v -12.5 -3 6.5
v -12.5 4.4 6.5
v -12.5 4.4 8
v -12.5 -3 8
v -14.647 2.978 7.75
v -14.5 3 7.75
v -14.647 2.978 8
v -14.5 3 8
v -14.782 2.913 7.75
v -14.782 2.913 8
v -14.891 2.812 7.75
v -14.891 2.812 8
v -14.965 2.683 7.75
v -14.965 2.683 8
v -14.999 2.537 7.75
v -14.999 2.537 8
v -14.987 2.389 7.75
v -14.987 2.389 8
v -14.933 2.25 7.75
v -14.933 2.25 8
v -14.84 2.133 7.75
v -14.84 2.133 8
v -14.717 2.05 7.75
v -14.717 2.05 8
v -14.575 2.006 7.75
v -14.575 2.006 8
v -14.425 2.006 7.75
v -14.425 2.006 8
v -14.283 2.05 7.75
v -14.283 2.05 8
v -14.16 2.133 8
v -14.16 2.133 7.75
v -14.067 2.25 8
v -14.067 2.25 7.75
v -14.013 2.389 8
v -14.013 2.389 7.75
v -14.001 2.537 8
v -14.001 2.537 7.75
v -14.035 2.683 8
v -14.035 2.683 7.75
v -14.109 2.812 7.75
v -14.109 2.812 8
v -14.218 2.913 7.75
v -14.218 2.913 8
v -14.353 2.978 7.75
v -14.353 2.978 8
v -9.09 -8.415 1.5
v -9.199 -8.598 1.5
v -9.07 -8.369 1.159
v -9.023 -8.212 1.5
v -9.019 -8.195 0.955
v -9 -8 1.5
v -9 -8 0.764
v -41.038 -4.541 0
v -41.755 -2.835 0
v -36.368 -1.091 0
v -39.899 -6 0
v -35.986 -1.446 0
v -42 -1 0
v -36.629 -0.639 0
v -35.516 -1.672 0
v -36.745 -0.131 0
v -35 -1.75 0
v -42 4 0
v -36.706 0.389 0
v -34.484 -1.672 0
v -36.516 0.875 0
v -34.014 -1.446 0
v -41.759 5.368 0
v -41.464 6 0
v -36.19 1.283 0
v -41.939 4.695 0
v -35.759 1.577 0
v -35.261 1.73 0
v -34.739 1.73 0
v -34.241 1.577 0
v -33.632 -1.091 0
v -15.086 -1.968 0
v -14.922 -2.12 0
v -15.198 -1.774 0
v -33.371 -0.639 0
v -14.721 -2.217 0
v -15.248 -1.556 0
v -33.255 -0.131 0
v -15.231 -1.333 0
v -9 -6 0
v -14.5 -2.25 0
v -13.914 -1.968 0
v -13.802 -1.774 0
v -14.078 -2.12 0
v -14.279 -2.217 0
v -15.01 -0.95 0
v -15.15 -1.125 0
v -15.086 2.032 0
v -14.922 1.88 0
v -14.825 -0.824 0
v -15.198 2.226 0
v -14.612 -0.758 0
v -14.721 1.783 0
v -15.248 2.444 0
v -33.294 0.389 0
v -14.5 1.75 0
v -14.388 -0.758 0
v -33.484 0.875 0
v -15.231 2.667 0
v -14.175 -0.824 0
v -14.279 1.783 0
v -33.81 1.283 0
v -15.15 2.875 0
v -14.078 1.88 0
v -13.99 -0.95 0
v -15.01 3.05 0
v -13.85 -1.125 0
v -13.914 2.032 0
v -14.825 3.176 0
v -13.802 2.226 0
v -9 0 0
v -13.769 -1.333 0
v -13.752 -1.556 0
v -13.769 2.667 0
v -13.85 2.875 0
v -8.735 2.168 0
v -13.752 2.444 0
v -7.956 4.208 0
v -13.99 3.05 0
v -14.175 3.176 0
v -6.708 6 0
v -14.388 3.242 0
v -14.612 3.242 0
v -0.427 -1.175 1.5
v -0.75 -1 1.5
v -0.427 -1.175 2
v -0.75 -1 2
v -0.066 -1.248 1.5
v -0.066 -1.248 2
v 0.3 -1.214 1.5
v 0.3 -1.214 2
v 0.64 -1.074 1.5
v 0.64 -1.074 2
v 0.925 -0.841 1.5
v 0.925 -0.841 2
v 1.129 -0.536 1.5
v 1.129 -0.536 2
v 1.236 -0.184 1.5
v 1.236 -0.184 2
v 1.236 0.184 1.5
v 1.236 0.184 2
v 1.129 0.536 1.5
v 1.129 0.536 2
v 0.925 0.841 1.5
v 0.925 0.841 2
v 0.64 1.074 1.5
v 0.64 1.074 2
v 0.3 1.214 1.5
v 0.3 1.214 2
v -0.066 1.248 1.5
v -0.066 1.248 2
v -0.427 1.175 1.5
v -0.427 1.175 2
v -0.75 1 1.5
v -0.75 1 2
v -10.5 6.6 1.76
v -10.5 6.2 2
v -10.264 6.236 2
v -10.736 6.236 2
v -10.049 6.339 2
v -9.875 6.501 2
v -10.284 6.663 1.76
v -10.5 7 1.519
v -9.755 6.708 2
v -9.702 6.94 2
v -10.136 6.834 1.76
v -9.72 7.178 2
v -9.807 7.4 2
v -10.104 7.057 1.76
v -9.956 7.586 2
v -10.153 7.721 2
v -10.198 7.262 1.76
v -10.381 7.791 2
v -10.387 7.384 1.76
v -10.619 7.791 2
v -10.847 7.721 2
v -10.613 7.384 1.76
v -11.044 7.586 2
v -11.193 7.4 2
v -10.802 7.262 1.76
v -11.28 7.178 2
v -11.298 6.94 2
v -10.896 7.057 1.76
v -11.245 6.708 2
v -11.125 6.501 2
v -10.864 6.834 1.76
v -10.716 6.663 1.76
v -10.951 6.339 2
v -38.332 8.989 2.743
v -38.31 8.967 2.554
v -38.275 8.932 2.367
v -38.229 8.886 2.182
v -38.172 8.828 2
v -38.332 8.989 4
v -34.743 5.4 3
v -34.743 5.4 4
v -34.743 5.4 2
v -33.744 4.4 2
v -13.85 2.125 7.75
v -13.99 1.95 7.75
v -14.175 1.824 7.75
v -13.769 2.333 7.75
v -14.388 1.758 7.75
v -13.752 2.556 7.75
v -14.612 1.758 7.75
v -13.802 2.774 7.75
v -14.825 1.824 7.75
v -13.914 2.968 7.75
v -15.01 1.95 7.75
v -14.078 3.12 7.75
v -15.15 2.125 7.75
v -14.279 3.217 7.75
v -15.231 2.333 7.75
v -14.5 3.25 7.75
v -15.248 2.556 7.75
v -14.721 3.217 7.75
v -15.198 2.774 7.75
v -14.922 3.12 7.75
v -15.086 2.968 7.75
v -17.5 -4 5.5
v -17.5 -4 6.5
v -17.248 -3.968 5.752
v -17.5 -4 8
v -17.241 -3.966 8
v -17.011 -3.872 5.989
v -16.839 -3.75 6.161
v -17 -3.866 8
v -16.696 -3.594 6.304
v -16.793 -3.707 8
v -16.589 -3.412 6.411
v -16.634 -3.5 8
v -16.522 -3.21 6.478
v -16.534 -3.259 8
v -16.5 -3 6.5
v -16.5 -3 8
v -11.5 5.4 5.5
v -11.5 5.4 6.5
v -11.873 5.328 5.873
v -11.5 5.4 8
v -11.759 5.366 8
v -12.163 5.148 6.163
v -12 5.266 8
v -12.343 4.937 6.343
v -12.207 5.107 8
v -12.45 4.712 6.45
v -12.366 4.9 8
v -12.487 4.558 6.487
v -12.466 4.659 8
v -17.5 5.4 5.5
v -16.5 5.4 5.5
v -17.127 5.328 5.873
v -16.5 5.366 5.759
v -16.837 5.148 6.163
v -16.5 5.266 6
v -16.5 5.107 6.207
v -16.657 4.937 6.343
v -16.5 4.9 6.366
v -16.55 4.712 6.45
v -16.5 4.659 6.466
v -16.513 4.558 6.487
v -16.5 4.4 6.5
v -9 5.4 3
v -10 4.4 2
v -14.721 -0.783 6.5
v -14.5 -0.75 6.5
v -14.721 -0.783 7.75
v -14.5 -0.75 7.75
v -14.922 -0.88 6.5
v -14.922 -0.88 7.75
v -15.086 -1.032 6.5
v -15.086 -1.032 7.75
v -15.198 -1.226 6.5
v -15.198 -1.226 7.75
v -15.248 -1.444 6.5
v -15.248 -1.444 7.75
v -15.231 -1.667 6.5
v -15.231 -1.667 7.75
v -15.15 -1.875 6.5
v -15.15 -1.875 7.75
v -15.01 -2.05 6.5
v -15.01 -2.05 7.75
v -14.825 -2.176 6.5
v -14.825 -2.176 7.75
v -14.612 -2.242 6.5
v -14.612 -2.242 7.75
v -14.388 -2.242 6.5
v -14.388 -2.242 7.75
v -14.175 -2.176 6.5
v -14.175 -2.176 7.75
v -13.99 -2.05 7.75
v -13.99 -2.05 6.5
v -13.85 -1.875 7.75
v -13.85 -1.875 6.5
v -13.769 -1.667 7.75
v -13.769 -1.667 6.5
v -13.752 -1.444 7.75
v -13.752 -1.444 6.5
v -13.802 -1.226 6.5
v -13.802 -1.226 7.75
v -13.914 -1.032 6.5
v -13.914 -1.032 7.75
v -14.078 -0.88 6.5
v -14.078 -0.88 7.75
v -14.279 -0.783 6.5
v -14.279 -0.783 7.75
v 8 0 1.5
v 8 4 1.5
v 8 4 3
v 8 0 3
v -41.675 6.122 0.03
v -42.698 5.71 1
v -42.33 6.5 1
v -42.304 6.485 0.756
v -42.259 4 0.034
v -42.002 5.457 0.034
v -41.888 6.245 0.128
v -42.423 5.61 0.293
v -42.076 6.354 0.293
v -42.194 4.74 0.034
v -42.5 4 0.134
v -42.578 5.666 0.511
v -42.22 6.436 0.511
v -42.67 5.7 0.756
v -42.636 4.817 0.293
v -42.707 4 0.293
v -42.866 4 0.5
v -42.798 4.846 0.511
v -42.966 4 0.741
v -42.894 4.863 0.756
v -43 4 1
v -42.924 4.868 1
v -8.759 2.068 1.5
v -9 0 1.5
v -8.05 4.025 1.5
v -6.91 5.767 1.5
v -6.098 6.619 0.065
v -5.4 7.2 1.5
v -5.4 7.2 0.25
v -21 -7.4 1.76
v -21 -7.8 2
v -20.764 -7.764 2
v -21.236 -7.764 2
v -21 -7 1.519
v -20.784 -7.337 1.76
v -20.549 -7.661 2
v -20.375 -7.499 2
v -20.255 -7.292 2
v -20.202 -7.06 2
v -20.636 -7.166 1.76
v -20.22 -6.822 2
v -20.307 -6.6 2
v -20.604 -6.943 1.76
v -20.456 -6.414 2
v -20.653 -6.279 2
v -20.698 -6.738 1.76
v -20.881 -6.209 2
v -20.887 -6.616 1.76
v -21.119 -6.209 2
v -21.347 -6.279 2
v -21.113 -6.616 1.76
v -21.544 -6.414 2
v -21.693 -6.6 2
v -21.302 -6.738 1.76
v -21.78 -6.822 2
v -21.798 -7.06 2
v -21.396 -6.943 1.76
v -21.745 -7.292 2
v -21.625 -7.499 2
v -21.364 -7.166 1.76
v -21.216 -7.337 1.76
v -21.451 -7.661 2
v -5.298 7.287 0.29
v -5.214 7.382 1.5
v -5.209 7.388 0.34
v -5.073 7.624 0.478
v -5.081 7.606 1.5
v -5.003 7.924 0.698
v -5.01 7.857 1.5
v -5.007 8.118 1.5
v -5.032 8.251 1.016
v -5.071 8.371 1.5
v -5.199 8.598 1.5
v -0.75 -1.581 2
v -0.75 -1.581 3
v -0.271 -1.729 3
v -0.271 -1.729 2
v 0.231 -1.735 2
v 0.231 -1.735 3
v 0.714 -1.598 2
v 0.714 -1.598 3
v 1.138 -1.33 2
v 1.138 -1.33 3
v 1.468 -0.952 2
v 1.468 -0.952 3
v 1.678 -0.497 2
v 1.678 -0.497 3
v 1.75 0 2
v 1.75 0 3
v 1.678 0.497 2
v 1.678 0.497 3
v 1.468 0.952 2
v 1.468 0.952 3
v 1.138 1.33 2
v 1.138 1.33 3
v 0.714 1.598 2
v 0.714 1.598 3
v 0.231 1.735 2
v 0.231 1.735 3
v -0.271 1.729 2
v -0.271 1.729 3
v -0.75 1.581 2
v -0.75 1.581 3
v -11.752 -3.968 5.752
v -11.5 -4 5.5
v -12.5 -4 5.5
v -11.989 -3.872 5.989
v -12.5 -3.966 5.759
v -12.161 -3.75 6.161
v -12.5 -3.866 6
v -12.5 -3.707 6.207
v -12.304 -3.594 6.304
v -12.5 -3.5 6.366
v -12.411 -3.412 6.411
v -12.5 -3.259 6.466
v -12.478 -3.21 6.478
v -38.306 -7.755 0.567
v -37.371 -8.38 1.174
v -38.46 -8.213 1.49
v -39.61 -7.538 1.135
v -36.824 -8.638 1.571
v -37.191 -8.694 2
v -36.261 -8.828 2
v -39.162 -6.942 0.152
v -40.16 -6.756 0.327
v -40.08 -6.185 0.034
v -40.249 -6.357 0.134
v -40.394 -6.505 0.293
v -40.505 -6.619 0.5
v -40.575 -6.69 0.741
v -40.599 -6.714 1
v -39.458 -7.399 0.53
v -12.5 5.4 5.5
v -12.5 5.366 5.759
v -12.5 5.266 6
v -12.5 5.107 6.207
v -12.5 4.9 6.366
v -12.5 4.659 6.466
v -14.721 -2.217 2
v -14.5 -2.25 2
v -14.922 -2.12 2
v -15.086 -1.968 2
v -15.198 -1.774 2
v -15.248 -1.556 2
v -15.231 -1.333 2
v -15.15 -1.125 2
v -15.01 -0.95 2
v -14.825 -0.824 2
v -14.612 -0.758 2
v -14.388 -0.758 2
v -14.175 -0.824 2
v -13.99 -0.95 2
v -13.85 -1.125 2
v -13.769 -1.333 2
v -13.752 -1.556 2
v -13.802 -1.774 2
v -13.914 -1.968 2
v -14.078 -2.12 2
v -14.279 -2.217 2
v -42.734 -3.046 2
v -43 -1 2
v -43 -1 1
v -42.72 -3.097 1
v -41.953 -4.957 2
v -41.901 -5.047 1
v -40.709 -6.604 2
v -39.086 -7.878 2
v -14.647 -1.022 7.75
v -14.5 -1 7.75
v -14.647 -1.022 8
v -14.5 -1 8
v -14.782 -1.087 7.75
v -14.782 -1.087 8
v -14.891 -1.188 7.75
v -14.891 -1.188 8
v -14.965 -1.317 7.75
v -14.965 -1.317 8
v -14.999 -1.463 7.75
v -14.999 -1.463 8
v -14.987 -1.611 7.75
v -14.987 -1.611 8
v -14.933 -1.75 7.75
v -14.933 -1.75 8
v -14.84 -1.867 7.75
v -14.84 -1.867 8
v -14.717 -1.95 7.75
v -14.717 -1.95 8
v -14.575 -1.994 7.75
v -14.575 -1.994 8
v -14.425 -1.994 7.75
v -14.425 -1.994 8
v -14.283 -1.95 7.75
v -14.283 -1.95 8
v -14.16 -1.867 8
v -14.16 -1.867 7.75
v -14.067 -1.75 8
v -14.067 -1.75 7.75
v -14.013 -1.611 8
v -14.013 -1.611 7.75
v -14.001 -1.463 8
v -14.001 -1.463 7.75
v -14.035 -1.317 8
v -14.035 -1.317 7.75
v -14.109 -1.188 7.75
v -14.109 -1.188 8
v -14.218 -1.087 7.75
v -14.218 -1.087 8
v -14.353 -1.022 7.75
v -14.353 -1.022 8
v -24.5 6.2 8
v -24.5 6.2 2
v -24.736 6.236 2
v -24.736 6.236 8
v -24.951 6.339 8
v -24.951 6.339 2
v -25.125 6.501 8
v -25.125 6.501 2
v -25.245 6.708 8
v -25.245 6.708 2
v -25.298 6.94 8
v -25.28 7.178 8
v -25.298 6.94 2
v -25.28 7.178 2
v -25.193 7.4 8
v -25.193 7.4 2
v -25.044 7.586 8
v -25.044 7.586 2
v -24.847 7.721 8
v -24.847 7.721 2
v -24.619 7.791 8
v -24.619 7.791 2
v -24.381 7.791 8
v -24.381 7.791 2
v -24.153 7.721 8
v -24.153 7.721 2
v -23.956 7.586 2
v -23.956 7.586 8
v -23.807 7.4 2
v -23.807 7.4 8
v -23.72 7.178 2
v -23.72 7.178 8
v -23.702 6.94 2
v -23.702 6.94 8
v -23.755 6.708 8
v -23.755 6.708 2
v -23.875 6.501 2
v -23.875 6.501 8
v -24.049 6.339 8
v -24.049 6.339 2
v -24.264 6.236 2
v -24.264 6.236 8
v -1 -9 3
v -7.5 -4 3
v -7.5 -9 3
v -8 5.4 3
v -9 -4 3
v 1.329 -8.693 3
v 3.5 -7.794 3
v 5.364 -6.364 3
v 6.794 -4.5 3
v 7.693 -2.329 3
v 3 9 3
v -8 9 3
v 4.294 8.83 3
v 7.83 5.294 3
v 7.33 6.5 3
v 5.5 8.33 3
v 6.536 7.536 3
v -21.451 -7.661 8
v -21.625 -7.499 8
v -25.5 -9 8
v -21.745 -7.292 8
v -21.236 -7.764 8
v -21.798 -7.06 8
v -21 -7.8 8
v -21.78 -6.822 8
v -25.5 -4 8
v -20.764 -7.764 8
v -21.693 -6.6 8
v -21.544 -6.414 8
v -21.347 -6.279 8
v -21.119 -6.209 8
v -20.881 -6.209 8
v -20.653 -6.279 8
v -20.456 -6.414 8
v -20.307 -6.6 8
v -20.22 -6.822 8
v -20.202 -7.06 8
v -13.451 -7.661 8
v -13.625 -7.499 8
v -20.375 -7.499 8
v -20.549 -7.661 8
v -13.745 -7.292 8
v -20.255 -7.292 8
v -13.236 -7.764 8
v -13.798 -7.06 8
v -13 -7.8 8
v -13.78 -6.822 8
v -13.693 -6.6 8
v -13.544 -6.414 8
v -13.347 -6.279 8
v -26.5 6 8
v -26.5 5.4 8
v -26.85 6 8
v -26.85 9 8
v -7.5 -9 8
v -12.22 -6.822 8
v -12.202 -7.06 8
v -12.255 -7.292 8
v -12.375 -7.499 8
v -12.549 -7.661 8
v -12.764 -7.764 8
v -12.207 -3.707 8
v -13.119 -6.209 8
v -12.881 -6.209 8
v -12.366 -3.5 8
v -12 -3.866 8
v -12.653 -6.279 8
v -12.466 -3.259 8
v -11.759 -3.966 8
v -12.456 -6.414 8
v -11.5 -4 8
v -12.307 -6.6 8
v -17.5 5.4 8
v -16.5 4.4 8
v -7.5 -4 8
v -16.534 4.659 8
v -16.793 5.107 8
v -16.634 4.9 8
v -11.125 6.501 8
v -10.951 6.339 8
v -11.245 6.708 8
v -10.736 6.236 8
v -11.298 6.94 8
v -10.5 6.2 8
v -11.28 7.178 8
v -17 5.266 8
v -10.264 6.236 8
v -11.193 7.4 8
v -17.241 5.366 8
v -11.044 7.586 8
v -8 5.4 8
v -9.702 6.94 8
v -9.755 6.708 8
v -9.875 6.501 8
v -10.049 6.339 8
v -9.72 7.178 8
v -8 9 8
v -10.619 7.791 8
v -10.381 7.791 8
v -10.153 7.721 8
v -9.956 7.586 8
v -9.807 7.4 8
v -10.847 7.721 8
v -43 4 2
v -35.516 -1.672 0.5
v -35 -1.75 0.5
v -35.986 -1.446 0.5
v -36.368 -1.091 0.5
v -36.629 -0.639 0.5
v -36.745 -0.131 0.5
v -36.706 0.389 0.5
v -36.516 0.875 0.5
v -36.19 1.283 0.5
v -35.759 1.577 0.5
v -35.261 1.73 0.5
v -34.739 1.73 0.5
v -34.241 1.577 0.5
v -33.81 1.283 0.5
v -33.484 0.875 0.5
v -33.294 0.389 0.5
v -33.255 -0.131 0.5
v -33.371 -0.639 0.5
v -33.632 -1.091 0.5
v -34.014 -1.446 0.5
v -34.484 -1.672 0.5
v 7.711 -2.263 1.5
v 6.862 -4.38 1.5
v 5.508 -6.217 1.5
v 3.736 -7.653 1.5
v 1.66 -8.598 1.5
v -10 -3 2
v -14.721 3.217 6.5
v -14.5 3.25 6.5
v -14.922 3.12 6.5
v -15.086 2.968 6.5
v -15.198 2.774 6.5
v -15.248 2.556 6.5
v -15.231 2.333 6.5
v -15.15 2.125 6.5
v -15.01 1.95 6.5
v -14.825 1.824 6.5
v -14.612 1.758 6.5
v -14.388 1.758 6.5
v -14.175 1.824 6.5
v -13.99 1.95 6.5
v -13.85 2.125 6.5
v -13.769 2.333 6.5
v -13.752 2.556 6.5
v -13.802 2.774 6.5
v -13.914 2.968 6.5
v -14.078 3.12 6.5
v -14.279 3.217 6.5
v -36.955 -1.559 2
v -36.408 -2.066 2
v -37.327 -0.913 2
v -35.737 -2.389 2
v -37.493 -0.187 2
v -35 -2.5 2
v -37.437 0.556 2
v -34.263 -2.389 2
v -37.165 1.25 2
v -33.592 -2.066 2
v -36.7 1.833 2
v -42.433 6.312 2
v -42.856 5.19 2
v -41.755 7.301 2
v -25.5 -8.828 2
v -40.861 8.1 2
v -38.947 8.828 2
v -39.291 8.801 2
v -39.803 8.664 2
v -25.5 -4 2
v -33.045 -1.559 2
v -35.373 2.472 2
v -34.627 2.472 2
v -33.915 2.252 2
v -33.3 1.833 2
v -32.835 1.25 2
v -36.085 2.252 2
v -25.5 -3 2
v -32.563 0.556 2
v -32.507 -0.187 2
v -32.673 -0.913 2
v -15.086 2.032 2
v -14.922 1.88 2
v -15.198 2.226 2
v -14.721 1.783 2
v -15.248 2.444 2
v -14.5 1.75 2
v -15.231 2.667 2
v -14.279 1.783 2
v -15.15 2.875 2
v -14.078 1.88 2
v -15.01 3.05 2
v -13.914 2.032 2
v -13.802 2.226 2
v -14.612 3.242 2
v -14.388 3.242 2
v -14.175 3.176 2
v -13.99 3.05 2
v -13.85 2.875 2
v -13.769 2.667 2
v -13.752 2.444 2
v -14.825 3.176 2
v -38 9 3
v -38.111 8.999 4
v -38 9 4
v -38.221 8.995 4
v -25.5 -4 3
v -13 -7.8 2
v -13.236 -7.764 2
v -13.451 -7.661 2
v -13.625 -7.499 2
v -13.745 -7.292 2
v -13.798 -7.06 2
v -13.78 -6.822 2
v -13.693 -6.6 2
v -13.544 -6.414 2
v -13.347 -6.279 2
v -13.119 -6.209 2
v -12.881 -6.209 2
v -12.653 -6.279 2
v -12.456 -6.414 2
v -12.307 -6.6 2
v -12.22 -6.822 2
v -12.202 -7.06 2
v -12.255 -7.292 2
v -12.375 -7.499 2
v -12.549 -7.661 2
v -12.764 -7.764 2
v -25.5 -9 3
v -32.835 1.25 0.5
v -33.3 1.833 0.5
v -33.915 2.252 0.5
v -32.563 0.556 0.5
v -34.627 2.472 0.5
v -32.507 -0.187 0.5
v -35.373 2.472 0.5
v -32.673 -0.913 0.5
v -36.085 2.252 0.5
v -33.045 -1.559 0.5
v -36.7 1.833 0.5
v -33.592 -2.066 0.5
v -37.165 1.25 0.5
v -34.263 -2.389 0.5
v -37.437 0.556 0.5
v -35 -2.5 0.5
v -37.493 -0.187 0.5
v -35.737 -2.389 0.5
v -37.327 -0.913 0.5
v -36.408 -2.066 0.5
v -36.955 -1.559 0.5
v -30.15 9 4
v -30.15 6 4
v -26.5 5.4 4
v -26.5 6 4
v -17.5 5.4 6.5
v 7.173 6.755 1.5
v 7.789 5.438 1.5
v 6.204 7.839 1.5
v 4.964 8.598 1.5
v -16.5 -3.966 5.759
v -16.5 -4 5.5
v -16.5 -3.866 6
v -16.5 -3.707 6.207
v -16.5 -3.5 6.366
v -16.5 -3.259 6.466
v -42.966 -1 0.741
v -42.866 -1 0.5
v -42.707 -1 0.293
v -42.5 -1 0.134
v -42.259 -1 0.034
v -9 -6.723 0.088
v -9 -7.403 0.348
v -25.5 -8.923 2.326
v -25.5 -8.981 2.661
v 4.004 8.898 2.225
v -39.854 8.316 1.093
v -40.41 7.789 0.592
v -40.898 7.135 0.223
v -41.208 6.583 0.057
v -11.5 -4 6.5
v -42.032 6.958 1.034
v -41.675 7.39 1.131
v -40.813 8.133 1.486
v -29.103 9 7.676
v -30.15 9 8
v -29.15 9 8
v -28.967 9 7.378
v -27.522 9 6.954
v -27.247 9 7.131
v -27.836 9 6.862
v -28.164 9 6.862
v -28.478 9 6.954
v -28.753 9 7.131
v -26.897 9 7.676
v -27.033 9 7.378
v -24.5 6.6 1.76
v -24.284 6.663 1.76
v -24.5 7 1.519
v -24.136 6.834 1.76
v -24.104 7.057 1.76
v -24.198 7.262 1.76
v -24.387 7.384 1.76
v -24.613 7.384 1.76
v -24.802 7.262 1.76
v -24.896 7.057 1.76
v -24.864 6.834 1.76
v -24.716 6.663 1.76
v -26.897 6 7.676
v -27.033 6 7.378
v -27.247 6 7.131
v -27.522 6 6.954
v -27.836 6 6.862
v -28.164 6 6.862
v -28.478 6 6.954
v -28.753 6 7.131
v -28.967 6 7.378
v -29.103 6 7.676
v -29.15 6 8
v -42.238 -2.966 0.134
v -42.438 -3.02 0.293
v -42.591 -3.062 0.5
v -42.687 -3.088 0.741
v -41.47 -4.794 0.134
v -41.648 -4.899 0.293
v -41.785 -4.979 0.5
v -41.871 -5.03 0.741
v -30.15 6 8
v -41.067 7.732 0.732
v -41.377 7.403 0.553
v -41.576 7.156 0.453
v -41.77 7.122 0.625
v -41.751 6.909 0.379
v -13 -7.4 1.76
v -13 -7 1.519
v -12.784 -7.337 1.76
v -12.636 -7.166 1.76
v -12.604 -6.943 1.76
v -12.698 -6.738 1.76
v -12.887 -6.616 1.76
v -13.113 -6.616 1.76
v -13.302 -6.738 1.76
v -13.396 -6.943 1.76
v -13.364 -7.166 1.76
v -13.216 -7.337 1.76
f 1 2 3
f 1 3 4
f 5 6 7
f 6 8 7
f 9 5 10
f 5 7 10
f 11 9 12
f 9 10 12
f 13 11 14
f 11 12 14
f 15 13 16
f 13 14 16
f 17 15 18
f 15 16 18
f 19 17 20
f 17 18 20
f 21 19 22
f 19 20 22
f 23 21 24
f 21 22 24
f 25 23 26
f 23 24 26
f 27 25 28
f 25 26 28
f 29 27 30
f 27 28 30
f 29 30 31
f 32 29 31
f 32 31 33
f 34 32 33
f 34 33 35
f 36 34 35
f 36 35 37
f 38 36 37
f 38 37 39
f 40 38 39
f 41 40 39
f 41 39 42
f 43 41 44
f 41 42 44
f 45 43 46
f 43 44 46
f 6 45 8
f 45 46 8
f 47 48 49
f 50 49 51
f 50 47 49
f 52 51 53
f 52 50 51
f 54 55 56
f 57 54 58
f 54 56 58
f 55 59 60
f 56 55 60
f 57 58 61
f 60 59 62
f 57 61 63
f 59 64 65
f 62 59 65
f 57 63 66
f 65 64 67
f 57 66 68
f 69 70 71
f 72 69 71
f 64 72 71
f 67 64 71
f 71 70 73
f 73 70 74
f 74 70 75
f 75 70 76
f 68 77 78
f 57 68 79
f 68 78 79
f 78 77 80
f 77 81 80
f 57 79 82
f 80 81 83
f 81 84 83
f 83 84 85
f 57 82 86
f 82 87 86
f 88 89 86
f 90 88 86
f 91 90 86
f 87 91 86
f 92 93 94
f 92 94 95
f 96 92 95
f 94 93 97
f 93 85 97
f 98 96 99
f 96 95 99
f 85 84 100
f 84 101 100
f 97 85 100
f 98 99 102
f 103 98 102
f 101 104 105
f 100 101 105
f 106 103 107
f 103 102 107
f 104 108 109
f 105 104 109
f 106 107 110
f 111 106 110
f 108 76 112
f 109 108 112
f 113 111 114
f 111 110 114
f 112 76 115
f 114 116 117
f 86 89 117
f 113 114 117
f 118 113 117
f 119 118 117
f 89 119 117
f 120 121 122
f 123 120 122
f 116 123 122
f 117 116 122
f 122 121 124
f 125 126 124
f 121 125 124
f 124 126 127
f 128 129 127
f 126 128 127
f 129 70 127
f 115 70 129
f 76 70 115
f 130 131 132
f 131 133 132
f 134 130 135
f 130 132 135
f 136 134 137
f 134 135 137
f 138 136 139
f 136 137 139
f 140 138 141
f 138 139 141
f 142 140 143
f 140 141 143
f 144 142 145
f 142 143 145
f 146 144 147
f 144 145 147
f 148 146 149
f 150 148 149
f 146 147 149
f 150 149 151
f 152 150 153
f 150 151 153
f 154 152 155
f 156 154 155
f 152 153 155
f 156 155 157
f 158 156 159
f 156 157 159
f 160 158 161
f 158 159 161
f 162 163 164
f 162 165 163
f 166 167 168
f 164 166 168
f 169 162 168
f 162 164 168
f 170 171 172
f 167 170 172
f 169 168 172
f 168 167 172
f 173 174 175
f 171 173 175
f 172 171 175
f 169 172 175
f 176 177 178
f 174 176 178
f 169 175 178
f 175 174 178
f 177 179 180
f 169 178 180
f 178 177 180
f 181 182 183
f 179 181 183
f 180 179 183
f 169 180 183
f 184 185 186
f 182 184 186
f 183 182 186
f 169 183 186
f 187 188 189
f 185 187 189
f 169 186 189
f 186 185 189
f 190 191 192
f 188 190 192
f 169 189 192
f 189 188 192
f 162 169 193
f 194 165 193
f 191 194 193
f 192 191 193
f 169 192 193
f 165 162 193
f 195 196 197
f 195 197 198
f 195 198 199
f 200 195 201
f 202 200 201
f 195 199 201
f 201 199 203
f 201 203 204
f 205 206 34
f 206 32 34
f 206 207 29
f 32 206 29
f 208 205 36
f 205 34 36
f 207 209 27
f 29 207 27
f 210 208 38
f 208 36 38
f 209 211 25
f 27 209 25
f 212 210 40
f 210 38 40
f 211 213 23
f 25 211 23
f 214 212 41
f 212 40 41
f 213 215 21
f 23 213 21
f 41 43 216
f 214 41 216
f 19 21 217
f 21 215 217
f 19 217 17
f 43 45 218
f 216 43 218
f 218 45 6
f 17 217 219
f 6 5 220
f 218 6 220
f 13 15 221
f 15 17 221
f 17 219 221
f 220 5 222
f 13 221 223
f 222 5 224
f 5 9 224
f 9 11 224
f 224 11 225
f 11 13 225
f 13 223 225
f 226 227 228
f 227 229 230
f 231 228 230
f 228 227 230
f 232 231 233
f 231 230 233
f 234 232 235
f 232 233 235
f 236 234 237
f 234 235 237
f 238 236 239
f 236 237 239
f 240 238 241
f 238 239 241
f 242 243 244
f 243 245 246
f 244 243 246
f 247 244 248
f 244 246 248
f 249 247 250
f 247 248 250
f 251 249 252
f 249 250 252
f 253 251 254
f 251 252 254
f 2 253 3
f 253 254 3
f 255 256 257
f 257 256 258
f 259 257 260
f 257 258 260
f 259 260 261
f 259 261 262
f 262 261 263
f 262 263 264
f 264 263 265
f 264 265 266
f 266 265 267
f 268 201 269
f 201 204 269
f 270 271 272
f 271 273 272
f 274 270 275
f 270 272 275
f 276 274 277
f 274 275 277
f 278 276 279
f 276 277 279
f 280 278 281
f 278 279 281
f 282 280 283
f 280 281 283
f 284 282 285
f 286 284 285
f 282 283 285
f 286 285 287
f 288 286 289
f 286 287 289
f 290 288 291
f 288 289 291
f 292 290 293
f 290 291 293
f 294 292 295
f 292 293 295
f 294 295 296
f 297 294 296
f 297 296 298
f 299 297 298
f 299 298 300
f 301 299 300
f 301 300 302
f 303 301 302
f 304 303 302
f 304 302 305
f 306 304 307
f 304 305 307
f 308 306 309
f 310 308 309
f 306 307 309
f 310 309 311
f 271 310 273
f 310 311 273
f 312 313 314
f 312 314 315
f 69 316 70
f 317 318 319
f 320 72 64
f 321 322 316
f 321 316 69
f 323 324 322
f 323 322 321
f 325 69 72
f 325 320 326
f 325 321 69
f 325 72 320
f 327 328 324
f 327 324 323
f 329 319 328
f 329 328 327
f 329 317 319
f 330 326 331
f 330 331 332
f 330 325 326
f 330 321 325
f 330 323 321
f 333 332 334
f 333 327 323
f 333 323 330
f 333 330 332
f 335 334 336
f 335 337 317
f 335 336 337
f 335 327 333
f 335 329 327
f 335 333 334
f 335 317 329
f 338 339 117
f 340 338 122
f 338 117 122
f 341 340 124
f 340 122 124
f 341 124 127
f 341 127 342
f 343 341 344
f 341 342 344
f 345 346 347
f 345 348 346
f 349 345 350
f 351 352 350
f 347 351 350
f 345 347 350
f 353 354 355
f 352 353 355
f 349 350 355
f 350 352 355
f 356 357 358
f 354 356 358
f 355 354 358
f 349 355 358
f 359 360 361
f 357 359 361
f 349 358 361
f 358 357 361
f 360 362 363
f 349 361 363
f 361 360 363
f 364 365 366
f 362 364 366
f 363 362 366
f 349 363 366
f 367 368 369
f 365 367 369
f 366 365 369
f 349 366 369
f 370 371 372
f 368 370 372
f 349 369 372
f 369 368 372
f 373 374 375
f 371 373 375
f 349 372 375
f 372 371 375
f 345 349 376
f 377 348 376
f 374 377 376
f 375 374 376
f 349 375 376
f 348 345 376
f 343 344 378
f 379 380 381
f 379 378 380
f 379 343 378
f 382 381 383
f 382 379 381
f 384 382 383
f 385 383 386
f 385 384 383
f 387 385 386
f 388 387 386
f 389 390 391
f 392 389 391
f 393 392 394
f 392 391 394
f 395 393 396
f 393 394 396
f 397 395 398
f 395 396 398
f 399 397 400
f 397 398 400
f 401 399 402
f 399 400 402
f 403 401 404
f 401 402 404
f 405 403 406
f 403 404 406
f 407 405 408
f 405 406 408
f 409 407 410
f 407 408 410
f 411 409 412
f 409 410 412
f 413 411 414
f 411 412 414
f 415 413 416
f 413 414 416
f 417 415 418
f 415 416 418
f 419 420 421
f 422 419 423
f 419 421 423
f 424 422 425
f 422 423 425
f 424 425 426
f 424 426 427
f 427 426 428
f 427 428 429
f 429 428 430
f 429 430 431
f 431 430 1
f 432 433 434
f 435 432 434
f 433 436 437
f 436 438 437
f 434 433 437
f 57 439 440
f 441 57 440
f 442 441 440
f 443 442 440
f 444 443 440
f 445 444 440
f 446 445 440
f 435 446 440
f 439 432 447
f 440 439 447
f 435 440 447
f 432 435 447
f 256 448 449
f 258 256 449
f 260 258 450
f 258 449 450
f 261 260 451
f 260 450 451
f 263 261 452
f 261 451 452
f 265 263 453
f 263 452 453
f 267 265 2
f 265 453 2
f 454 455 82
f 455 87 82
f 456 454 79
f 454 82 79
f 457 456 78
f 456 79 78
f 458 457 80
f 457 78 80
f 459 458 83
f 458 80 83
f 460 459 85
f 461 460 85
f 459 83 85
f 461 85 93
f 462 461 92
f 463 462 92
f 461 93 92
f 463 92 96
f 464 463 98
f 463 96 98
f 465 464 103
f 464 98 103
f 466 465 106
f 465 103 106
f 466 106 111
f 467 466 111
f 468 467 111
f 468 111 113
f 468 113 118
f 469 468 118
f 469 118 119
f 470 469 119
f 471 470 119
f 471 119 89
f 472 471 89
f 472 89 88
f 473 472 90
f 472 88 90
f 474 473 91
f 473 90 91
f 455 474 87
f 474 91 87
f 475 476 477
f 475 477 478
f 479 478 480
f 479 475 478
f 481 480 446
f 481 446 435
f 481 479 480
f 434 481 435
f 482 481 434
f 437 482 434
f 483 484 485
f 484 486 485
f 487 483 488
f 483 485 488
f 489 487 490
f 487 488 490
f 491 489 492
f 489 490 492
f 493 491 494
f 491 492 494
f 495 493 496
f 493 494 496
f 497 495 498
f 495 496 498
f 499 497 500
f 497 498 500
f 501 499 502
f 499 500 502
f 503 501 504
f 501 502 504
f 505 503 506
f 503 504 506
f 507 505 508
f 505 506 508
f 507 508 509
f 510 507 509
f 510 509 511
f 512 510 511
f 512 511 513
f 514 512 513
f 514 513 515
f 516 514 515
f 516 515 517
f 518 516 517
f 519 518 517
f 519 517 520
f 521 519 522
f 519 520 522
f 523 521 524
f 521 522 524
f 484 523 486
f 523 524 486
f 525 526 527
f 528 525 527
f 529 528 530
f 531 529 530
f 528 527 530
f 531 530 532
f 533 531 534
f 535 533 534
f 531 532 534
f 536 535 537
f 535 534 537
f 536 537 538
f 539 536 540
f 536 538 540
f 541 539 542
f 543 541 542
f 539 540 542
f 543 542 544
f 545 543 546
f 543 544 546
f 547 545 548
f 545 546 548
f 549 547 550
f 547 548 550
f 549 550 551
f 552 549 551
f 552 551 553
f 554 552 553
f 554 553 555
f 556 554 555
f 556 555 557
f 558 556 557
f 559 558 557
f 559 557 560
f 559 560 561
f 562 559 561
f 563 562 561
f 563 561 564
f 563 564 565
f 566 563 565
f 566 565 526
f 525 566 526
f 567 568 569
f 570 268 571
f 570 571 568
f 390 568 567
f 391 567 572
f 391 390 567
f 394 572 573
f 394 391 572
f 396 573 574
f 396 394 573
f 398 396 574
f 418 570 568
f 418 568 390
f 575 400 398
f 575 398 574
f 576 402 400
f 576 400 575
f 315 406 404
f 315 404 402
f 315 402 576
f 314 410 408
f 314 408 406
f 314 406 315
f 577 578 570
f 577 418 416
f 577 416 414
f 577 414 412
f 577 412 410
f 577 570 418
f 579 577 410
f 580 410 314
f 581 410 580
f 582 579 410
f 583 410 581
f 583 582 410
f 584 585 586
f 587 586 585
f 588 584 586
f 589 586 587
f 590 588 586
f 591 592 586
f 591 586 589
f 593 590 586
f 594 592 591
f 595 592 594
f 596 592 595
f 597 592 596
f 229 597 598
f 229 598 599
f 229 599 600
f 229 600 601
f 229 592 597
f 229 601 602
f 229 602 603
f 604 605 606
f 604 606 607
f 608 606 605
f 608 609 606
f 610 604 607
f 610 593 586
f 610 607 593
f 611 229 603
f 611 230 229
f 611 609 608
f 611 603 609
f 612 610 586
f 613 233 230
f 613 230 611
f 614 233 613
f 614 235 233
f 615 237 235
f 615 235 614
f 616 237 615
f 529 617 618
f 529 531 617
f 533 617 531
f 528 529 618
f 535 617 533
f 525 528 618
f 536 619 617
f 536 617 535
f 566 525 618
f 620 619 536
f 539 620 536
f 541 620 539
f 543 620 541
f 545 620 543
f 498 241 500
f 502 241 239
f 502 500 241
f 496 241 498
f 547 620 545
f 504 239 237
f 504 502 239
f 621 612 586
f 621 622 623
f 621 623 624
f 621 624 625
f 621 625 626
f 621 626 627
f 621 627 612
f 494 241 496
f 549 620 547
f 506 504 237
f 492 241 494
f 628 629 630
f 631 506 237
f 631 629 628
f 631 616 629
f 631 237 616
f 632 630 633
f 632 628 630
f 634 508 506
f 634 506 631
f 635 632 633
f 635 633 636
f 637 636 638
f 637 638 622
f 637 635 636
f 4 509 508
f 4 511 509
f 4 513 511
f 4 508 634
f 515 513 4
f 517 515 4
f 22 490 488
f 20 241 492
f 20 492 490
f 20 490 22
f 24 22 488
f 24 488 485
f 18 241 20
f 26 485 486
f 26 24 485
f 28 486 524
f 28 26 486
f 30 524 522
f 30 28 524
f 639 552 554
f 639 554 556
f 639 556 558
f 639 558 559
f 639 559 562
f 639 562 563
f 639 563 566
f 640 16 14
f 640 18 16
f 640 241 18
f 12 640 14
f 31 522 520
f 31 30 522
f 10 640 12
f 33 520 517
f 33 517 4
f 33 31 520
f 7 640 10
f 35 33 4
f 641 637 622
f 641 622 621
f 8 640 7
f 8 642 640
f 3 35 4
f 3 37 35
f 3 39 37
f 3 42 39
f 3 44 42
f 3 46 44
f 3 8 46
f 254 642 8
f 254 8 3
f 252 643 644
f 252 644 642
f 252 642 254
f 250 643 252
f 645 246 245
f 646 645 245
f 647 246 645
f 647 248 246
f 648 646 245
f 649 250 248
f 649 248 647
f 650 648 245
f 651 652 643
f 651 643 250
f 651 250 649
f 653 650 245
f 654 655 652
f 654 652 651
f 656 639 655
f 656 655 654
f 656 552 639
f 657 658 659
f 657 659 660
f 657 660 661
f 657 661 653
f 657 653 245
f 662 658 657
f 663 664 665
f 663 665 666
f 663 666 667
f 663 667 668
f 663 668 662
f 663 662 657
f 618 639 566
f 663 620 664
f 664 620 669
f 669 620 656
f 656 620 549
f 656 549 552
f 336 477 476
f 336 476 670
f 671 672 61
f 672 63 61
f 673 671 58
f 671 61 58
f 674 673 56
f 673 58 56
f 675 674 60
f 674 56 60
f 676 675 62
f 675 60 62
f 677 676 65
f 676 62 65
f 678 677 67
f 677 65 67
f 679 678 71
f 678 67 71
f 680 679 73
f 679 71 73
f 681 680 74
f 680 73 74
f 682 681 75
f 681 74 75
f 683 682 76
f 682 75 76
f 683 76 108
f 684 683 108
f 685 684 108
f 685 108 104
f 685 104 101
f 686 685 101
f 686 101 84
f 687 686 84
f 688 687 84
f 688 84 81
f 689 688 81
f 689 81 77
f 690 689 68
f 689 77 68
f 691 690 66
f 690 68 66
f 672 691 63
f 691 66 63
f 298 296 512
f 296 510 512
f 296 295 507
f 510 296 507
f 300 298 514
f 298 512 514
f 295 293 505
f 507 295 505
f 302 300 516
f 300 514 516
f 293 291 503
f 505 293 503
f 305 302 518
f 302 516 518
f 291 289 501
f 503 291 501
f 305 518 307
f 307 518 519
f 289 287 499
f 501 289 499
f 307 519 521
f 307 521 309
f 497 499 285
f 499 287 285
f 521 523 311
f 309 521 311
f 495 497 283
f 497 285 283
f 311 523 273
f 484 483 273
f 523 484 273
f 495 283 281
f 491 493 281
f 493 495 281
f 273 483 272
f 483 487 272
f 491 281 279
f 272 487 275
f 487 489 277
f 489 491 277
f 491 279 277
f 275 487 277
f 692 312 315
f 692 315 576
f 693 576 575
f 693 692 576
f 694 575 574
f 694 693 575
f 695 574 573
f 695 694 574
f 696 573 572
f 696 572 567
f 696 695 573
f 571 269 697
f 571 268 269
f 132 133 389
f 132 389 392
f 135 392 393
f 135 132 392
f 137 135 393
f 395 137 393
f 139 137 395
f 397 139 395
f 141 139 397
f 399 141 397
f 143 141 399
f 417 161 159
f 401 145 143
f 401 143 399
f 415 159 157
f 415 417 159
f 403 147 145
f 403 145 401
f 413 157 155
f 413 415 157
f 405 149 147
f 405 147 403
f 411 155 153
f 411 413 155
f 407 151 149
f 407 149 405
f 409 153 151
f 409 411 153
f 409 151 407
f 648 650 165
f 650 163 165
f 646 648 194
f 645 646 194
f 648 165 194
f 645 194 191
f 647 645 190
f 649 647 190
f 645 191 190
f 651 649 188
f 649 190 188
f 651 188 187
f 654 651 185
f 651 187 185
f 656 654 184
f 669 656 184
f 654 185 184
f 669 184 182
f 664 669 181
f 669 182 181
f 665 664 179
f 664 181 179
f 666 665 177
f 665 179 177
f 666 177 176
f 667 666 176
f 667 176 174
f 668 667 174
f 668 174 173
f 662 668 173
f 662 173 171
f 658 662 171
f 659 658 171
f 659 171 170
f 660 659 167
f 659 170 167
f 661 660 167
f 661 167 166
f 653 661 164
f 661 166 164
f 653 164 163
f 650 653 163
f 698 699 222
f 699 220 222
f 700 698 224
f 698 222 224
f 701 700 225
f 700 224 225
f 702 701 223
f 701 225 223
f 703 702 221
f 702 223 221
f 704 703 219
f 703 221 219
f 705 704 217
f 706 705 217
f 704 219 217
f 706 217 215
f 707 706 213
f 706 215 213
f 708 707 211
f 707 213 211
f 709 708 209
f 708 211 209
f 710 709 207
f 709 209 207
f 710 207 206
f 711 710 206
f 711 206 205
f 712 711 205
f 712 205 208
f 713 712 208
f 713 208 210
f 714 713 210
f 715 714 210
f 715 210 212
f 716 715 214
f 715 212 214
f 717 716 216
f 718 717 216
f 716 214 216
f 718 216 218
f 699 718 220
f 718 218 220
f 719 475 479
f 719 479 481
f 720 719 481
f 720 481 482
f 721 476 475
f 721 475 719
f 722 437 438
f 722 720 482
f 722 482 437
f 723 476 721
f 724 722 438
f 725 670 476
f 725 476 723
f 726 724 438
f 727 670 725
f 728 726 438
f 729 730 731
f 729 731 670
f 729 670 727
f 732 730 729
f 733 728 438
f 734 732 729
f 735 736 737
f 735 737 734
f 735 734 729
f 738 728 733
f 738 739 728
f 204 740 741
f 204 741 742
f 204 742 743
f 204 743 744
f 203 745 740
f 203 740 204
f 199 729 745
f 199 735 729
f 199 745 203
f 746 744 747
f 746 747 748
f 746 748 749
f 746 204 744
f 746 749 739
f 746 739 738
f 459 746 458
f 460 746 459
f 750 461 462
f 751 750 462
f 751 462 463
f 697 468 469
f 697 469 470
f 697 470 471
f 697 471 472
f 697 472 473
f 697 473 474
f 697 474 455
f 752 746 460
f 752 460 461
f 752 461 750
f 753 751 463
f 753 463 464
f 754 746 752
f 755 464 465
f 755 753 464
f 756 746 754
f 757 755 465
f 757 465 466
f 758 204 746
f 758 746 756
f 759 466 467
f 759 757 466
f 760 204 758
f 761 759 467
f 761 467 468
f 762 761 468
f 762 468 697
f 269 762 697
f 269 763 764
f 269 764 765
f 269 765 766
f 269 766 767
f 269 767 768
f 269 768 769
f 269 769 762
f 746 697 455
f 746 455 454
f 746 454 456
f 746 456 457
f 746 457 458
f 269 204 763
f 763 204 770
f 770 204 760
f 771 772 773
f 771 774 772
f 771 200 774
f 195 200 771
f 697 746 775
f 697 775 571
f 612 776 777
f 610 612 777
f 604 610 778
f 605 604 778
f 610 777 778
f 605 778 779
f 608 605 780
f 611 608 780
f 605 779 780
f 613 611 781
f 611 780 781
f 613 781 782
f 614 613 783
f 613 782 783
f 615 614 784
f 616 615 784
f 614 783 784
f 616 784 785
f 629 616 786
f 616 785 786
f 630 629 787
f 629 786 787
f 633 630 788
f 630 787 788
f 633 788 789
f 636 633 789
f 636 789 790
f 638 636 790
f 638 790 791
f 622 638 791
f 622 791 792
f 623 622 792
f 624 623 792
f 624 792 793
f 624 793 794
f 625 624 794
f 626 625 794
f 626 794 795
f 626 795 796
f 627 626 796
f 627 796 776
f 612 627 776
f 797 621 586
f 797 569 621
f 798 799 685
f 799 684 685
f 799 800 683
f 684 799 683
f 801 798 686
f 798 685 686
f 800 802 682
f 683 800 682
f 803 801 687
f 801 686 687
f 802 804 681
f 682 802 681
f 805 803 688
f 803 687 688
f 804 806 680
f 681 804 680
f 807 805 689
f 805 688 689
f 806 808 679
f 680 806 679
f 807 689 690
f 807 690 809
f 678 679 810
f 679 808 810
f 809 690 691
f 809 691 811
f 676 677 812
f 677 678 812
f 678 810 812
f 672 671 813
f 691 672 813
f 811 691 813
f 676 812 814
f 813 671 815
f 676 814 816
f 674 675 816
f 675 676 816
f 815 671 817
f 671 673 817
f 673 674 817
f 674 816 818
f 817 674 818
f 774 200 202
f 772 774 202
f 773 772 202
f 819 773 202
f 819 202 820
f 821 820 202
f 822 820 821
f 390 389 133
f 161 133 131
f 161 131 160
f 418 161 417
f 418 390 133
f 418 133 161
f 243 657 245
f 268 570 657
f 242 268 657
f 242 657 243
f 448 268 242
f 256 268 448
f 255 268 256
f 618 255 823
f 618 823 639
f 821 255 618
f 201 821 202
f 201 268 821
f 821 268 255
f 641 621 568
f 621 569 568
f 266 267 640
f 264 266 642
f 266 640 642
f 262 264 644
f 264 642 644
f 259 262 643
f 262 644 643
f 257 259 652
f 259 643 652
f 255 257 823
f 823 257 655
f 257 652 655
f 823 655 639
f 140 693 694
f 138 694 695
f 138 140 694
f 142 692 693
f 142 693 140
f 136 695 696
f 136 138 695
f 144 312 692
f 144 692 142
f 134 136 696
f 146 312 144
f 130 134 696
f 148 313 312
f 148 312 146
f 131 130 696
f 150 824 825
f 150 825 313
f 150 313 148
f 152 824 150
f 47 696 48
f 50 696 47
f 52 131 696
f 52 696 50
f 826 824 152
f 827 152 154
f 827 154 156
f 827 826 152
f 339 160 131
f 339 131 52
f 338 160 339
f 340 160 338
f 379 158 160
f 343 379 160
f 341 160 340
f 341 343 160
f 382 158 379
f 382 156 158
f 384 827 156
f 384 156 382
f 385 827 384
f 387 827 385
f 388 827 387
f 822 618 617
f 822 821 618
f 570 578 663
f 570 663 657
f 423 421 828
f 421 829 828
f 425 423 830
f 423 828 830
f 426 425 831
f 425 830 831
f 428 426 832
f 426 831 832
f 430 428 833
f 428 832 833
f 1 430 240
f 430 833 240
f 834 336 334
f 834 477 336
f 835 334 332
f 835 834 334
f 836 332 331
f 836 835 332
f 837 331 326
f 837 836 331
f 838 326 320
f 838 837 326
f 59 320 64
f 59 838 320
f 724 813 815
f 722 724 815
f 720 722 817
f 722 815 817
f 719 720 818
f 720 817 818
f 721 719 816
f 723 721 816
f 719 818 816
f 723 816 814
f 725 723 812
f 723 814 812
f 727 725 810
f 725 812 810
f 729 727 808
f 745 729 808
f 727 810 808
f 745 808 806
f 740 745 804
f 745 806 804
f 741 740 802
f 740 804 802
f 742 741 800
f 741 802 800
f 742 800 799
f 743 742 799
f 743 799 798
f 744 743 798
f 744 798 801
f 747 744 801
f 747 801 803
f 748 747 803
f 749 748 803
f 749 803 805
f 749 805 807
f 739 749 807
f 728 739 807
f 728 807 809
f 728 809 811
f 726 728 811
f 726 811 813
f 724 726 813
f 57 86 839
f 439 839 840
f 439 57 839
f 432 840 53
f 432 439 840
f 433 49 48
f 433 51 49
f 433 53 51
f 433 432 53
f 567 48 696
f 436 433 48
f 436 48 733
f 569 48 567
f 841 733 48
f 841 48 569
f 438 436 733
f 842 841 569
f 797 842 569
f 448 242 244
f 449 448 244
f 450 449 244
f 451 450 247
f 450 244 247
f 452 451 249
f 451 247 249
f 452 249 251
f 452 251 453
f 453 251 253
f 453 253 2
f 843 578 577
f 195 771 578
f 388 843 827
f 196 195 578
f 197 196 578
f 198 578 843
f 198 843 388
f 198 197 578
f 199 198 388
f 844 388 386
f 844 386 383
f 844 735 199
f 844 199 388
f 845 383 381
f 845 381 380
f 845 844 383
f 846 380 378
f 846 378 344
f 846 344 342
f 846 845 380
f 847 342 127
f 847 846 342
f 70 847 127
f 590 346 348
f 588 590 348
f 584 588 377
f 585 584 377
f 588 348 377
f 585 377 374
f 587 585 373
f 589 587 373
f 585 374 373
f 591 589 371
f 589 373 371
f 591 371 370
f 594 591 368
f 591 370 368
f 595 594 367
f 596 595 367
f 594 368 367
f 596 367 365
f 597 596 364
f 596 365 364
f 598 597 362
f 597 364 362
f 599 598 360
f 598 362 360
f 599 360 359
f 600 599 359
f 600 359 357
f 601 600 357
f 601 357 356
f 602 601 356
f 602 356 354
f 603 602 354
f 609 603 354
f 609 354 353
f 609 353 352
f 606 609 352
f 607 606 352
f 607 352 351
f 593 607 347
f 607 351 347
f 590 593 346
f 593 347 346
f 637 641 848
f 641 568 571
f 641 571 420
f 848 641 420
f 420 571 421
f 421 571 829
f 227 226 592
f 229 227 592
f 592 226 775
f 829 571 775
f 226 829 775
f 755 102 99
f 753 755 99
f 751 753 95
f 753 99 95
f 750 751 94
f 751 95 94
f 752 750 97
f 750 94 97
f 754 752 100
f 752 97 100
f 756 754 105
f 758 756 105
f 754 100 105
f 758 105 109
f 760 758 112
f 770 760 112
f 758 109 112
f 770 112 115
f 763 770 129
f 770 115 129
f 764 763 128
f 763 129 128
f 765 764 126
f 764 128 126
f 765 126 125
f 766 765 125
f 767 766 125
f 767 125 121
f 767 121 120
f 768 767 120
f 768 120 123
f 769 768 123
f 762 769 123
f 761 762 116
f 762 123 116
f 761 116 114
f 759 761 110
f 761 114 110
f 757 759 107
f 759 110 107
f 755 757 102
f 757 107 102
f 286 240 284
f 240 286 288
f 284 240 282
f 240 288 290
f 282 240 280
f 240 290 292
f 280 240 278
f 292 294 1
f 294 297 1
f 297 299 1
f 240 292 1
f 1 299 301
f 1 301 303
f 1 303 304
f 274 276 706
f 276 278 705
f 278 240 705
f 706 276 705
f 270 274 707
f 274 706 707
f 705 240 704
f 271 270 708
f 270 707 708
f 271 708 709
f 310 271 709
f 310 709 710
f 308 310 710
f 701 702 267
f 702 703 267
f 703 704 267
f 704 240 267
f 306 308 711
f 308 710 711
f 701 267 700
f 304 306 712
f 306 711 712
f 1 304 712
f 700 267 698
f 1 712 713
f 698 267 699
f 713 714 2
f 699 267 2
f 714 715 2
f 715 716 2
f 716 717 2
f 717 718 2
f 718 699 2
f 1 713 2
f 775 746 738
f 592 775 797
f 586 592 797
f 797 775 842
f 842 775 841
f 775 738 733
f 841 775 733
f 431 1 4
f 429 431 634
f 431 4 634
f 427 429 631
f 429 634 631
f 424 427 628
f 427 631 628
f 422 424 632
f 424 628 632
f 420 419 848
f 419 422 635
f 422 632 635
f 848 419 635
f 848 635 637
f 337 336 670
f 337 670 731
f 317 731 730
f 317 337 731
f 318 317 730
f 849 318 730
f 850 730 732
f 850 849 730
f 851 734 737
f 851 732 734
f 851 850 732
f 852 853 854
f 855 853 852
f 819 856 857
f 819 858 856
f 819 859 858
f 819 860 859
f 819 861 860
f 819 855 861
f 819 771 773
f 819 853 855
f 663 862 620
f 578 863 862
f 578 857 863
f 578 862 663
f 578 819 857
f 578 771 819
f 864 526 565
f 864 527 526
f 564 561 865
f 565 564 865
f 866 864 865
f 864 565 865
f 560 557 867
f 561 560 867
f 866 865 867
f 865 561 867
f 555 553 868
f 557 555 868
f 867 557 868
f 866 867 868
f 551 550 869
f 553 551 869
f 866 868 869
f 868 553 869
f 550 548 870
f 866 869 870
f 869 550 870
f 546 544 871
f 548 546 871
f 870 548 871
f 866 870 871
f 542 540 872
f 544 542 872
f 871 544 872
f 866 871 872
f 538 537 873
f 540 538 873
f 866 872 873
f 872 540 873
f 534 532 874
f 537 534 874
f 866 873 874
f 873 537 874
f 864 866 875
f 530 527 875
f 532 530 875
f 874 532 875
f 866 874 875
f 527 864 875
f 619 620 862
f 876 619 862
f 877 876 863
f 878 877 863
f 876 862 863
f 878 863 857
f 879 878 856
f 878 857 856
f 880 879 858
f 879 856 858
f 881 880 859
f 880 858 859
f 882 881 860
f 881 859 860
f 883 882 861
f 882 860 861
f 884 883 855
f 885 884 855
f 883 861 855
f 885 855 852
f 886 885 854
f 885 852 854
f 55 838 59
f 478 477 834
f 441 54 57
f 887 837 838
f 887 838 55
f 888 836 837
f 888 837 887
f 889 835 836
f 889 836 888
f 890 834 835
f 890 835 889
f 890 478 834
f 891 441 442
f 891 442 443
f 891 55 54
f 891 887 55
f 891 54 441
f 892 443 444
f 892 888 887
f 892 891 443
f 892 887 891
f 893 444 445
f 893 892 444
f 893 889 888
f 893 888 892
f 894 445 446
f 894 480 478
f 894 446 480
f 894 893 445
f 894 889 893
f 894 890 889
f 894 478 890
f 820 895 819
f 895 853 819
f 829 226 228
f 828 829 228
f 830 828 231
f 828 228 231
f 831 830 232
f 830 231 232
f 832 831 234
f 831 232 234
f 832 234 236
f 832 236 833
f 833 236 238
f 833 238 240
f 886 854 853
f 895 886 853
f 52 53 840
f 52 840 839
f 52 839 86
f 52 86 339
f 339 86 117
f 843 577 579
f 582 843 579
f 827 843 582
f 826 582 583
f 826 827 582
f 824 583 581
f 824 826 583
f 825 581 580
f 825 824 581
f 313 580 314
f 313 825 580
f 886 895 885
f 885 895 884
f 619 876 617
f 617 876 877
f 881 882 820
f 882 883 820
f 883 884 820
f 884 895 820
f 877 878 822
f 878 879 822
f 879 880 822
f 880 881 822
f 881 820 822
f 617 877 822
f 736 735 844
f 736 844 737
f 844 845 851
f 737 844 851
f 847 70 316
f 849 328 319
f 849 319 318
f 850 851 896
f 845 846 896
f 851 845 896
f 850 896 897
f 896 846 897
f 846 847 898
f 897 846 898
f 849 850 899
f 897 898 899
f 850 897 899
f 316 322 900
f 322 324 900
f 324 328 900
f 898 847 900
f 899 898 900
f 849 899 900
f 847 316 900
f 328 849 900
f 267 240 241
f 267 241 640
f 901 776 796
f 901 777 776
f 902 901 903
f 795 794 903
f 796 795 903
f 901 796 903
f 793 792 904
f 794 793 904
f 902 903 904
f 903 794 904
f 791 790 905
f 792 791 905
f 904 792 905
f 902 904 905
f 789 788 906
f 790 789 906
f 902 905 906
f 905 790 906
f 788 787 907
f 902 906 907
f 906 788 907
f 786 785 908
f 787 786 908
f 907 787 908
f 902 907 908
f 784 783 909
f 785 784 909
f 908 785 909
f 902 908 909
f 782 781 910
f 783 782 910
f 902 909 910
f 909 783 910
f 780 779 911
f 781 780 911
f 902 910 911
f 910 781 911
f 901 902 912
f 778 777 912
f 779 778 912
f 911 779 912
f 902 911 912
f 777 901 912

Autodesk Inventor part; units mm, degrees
ref_plane "YZ Plane" through (0, 0, 0) normal (1, 0, 0) x (0, 1, 0)
ref_plane "XZ Plane" through (0, 0, 0) normal (0, 1, 0) x (-1, 0, 0)
ref_plane "XY Plane" through (0, 0, 0) normal (0, 0, 1) x (1, 0, 0)
sketch "axes" plane through (0, 0, 0) normal (0, 0, 1) x (1, 0, 0)
  point P0 (0, 0)
  point P1 (-35, 0)
  point P2 (0, 0)
  dimension "d0" = 35
sketch "tendon anchors" plane through (0, 0, 0) normal (0, 0, 1) x (1, 0, 0)
  line L0 (-8.2564, 0) -> (0, 0) construction
  line L1 (0, 0) -> (-7.5, -7.5) construction
  line L2 (-27.0254, 0) -> (-35, 0) construction
  line L3 (-35, 0) -> (-25.5, -5.5) construction
  dimension "d136" = 7.5
  dimension "d137" = 7.5
  dimension "d138" = 5.5
  dimension "d139" = 9.5
sketch "Sketch3" plane through (0, 0, 0) normal (0, 0, 1) x (1, 0, 0)
  line L0 (-43, 9) -> (8, 9)
  line L1 (8, 9) -> (8, -9)
  line L2 (8, -9) -> (-43, -9)
  line L3 (-43, -9) -> (-43, 9)
  point P0 (0, 0)
  point P1 (8, 0)
  point P2 (-35, 0)
  dimension "d1" = 18
  dimension "d2" = 8
  dimension "d3" = 8
extrude "base plate" add sketch "Sketch3" along normal blind 2
sketch "Sketch4" plane through (0, 0, 2) normal (0, 0, 1) x (1, 0, 0)
  line L0 (8, 9) -> (-43, 9) projected
  line L1 (-43, 9) -> (-43, -9) projected
  line L2 (-43, -9) -> (8, -9) projected
  line L3 (8, -9) -> (8, 9) projected
  line L4 (-26.5, 9) -> (-8, 9)
  line L5 (-8, 9) -> (-8, 5.4)
  line L6 (-8, 5.4) -> (-26.5, 5.4)
  line L7 (-26.5, 5.4) -> (-26.5, 9)
  line L8 (-25.5, -9) -> (-7.5, -9)
  line L9 (-7.5, -9) -> (-7.5, -4)
  line L10 (-7.5, -4) -> (-25.5, -4)
  line L11 (-25.5, -4) -> (-25.5, -9)
  point P0 (0, 0)
  point P1 (-25.5, -5.5)
  point P2 (-7.5, -7.5)
  dimension "d6" = 5
  dimension "d7" = 3.6
  dimension "d8" = 16.5
  dimension "d9" = 16
extrude "walls" add sketch "Sketch4" along normal blind 4.5 contours L5 L6 L7 L0 | L2 L11 L10 L9
sketch "Sketch5" plane through (0, 0, 2) normal (0, 0, 1) x (1, 0, 0)
  point P0 (0, 0)
  point P1 (-35, 0)
  point P2 (0, 0)
hole "joint bearings" at (-35, 0, 2) direction (0, 0, -1) diameter 3.5 end through all counterbore diameter 5 counterbore depth 1.5
fillet "front top" radius 5 1 edges at (-43, 9, 1)
fillet "front bottom" radius 8 1 edges at (-43, -9, 1)
sketch "Sketch7" plane through (0, 0, 2) normal (0, 0, 1) x (1, 0, 0)
  circle A0 centre (-35, 0) radius 4
  line L0 (-26.5, 9) -> (-38, 9) projected
  arc A1 (-38, 9) -> (-43, 4) centre (-38, 4) ccw projected
  line L1 (-26.5, 5.4) -> (-26.5, 9) projected
  line L2 (-38.3321, 8.989) -> (-32.1716, 2.8284)
  line L3 (-35, 0) -> (-47.831, 0) construction
  line L4 (-26.5, 5.4) -> (-34.7431, 5.4)
  point P0 (0, 0)
  dimension "d33" = 8
  dimension "d34" = 45
extrude "extension endstop" add sketch "Sketch7" along normal blind 2 contours L2 A1 L0 L1 L4
sketch "Sketch8" plane through (0, 0, 2) normal (0, 0, 1) x (1, 0, 0)
  point P0 (0, 0)
  point P1 (-35, 0)
  point P2 (-14.5, 2.5)
  point P3 (-14.5, 2.5)
  point P4 (-14.5, -1.5)
  dimension "d41" = 20.5
  dimension "d73" = 2.5
  dimension "d127" = 1.5
hole "spring pin" at (-14.5, 2.5, 2) at (-14.5, -1.5, 2) direction (0, 0, -1) diameter 1.5 end through all
sketch "Sketch10" plane through (0, 0, 2) normal (0, 0, 1) x (1, 0, 0)
  line L0 (-9, -9) -> (8, -9)
  line L1 (8, -9) -> (8, 9)
  line L2 (8, 9) -> (-9, 9)
  line L3 (-9, 9) -> (-9, -9)
  point P0 (0, 0)
  point P1 (-8, 9)
  dimension "d126" = 17
extrude "Extrusion4" add sketch "Sketch10" along normal blind 1
sketch "Sketch11" plane through (0, 0, 0) normal (0, 0, -1) x (-1, 0, 0)
  circle A0 centre (0, 0) radius 9
  line L0 (0, 9) -> (-9, 9)
  line L1 (-9, 9) -> (-9, -9)
  line L2 (-9, -9) -> (9, -9)
  line L3 (9, -9) -> (9, 0)
  dimension "d57" = 18
extrude "Extrusion5" cut sketch "Sketch11" against normal blind 1.5
fillet "Fillet5" radius 1 2 edges at (0, 9, 0.75) (-9, -9, 0.75)
fillet "Fillet6" radius 5 1 edges at (8, 9, 2.25)
fillet "Fillet7" radius 9 1 edges at (8, -9, 2.25)
sketch "Sketch12" plane through (0, 0, 3) normal (0, 0, 1) x (1, 0, 0)
  circle A0 centre (0, 0) radius 1.75
  line L0 (-0.75, -1.5811) -> (-0.75, 1.5811)
  dimension "d63" = 3.5
  dimension "d140" = 0.75
extrude "Extrusion6" cut sketch "Sketch12" against normal blind 1 contours A0 L0 picked at (0.0833, 0)
sketch "Sketch18" plane through (0, 0, 6.5) normal (0, 0, 1) x (1, 0, 0)
  line L0 (-26.5, 9) -> (-26.5, 5.4) projected
  line L1 (-26.5, 5.4) -> (-8, 5.4) projected
  line L2 (-8, 5.4) -> (-8, 9) projected
  line L3 (-8, 9) -> (-26.5, 9) projected
  line L4 (-25.5, -9) -> (-7.5, -9) projected
  line L5 (-7.5, -9) -> (-7.5, -4) projected
  line L6 (-7.5, -4) -> (-25.5, -4) projected
  line L7 (-25.5, -4) -> (-25.5, -9) projected
  circle A0 centre (-14.5, 2.5) radius 0.75 projected
  line L8 (-16.5, 5.4) -> (-12.5, 5.4)
  line L9 (-12.5, 5.4) -> (-12.5, -4)
  line L10 (-12.5, -4) -> (-16.5, -4)
  line L11 (-16.5, -4) -> (-16.5, 5.4)
  line L12 (-14.5, 2.5) -> (-14.5, -2.026) construction
  point P0 (0, 0)
  dimension "d105" = 4
extrude "Extrusion8" add sketch "Sketch18" along normal blind 1.5 contours L3 L2 L1 L0 | L1 L9 L6 L11 | L6 L5 L4 L7 | A0
sketch "Sketch19" plane through (0, 0, 6.5) normal (0, 0, -1) x (-1, 0, 0)
  circle A0 centre (14.5, 2.5) radius 0.75 projected
  circle A1 centre (14.5, -1.5) radius 0.75 projected
  point P0 (0, 0)
hole "spring pins support" at (-14.5, 2.5, 6.5) at (-14.5, -1.5, 6.5) direction (0, 0, 1) diameter 1 end through all counterbore diameter 1.5 counterbore depth 1.25
sketch "Sketch14" plane through (0, 0, 3) normal (0, 0, 1) x (1, 0, 0)
  line L0 (-0.75, -1.5811) -> (-0.75, 1.5811) projected
  arc A0 (-0.75, -1) -> (-0.75, 1) centre (0, 0) ccw
  dimension "d133" = 2.5
extrude "Extrusion11" cut sketch "Sketch14" against normal through all
sketch "Sketch17" plane through (0, 0, 8) normal (0, 0, 1) x (1, 0, 0)
  point P0 (5, 0)
  point P1 (-21, -7)
  point P2 (-13, -7)
  point P3 (-24.5, 7)
  point P4 (-10.5, 7)
  point P5 (-35, 0)
  point P6 (0, 0)
  point P7 (-35, 0)
  point P8 (0, 0)
  dimension "d92" = 7
  dimension "d93" = 7
  dimension "d94" = 10.5
  dimension "d95" = 10.5
  dimension "d96" = 14
  dimension "d97" = 13
hole "mounting" at (-24.5, 7, 8) at (-10.5, 7, 8) at (-21, -7, 8) at (-13, -7, 8) direction (0, 0, -1) diameter 1.6 depth 6 tip angle 118
sketch "Sketch20" plane through (-43, 4, 0) normal (-1, 0, 0) x (0, 0, 1)
  line L0 (3, 5) -> (20, 5)
  line L1 (20, 5) -> (20, -13)
  line L2 (20, -13) -> (3, -13)
  line L3 (0, -10) -> (0, 2)
  arc A0 (3, 5) -> (0, 2) centre (3, 2) ccw
  arc A1 (0, -10) -> (3, -13) centre (3, -10) ccw
  point P0 (0, -4)
  point P1 (0, 5)
  point P2 (0, -13)
  point P3 (0, -13)
  dimension "d115" = 20
  dimension "d116" = 3
extrude "side fillet" cut sketch "Sketch20" against normal through all keep common part
fillet "Fillet8" radius 1 5 edges at (-39.0048, -7.9255, 0.6994) (-43, 1.5, 0) (-42.8945, 5.0215, 0) (-41.0629, 7.9521, 0.722) (-42.5485, -3.6495, 0)
sketch "Sketch21" plane through (-38, 9, 4) normal (0, 1, 0) x (1, 0, 0)
  line L0 (11.5, 0) -> (0, 0) projected
  line L1 (11.5, 0) -> (11.5, -4) projected
  line L2 (10, -4) -> (10, -4) construction
  line L3 (11.15, -4) -> (11.15, -4)
  line L4 (8.85, -4) -> (8.85, -4)
  arc A0 (8.85, -4) -> (11.15, -4) centre (10, -4) ccw
  arc A1 (11.15, -4) -> (8.85, -4) centre (10, -4) ccw
  line L5 (8.85, -4) -> (7.85, -4)
  line L6 (7.85, -4) -> (7.85, 0)
  line L7 (11.15, -4) -> (11.5, -4)
  point P0 (38, 4)
  point P1 (10, -3.75)
  point P2 (3, 4)
  dimension "d120" = 2.3
  dimension "d121" = 7
  dimension "d122" = 0
  dimension "d123" = 1
extrude "cable clip" add sketch "Sketch21" against normal blind 3 contours L1 L7 A1 L5 L6 L0
chamfer "Chamfer1" distance 1 angle 45 3 edges at (-9, 0.7, 2) (-21.8716, 5.4, 2) (-17.25, -4, 2)
fillet "Fillet9" radius 1 4 edges at (-16.5, 5.4, 7.25) (-12.5, 5.4, 7.25) (-12.5, -4, 7.25) (-16.5, -4, 7.25)
fillet "Fillet10" radius 1 4 edges at (-17, -4, 6.5) (-12, -4, 6.5) (-12, 5.4, 6.5) (-17, 5.4, 6.5)
equation "\"d0\" = MCP_PIP_length"
equation "\"d41\" = PIP_spring_length"
equation "\"MCP_PIP_length\" = F5_MCP_PIP_length"
equation "\"PIP_spring_length\" = F5_PIP_spring_length"
equation "\"F5_MCP_PIP_length\" = 35"
equation "\"F5_PIP_spring_length\" = 20.5"
properties part number "phalanx 1 R F5"
